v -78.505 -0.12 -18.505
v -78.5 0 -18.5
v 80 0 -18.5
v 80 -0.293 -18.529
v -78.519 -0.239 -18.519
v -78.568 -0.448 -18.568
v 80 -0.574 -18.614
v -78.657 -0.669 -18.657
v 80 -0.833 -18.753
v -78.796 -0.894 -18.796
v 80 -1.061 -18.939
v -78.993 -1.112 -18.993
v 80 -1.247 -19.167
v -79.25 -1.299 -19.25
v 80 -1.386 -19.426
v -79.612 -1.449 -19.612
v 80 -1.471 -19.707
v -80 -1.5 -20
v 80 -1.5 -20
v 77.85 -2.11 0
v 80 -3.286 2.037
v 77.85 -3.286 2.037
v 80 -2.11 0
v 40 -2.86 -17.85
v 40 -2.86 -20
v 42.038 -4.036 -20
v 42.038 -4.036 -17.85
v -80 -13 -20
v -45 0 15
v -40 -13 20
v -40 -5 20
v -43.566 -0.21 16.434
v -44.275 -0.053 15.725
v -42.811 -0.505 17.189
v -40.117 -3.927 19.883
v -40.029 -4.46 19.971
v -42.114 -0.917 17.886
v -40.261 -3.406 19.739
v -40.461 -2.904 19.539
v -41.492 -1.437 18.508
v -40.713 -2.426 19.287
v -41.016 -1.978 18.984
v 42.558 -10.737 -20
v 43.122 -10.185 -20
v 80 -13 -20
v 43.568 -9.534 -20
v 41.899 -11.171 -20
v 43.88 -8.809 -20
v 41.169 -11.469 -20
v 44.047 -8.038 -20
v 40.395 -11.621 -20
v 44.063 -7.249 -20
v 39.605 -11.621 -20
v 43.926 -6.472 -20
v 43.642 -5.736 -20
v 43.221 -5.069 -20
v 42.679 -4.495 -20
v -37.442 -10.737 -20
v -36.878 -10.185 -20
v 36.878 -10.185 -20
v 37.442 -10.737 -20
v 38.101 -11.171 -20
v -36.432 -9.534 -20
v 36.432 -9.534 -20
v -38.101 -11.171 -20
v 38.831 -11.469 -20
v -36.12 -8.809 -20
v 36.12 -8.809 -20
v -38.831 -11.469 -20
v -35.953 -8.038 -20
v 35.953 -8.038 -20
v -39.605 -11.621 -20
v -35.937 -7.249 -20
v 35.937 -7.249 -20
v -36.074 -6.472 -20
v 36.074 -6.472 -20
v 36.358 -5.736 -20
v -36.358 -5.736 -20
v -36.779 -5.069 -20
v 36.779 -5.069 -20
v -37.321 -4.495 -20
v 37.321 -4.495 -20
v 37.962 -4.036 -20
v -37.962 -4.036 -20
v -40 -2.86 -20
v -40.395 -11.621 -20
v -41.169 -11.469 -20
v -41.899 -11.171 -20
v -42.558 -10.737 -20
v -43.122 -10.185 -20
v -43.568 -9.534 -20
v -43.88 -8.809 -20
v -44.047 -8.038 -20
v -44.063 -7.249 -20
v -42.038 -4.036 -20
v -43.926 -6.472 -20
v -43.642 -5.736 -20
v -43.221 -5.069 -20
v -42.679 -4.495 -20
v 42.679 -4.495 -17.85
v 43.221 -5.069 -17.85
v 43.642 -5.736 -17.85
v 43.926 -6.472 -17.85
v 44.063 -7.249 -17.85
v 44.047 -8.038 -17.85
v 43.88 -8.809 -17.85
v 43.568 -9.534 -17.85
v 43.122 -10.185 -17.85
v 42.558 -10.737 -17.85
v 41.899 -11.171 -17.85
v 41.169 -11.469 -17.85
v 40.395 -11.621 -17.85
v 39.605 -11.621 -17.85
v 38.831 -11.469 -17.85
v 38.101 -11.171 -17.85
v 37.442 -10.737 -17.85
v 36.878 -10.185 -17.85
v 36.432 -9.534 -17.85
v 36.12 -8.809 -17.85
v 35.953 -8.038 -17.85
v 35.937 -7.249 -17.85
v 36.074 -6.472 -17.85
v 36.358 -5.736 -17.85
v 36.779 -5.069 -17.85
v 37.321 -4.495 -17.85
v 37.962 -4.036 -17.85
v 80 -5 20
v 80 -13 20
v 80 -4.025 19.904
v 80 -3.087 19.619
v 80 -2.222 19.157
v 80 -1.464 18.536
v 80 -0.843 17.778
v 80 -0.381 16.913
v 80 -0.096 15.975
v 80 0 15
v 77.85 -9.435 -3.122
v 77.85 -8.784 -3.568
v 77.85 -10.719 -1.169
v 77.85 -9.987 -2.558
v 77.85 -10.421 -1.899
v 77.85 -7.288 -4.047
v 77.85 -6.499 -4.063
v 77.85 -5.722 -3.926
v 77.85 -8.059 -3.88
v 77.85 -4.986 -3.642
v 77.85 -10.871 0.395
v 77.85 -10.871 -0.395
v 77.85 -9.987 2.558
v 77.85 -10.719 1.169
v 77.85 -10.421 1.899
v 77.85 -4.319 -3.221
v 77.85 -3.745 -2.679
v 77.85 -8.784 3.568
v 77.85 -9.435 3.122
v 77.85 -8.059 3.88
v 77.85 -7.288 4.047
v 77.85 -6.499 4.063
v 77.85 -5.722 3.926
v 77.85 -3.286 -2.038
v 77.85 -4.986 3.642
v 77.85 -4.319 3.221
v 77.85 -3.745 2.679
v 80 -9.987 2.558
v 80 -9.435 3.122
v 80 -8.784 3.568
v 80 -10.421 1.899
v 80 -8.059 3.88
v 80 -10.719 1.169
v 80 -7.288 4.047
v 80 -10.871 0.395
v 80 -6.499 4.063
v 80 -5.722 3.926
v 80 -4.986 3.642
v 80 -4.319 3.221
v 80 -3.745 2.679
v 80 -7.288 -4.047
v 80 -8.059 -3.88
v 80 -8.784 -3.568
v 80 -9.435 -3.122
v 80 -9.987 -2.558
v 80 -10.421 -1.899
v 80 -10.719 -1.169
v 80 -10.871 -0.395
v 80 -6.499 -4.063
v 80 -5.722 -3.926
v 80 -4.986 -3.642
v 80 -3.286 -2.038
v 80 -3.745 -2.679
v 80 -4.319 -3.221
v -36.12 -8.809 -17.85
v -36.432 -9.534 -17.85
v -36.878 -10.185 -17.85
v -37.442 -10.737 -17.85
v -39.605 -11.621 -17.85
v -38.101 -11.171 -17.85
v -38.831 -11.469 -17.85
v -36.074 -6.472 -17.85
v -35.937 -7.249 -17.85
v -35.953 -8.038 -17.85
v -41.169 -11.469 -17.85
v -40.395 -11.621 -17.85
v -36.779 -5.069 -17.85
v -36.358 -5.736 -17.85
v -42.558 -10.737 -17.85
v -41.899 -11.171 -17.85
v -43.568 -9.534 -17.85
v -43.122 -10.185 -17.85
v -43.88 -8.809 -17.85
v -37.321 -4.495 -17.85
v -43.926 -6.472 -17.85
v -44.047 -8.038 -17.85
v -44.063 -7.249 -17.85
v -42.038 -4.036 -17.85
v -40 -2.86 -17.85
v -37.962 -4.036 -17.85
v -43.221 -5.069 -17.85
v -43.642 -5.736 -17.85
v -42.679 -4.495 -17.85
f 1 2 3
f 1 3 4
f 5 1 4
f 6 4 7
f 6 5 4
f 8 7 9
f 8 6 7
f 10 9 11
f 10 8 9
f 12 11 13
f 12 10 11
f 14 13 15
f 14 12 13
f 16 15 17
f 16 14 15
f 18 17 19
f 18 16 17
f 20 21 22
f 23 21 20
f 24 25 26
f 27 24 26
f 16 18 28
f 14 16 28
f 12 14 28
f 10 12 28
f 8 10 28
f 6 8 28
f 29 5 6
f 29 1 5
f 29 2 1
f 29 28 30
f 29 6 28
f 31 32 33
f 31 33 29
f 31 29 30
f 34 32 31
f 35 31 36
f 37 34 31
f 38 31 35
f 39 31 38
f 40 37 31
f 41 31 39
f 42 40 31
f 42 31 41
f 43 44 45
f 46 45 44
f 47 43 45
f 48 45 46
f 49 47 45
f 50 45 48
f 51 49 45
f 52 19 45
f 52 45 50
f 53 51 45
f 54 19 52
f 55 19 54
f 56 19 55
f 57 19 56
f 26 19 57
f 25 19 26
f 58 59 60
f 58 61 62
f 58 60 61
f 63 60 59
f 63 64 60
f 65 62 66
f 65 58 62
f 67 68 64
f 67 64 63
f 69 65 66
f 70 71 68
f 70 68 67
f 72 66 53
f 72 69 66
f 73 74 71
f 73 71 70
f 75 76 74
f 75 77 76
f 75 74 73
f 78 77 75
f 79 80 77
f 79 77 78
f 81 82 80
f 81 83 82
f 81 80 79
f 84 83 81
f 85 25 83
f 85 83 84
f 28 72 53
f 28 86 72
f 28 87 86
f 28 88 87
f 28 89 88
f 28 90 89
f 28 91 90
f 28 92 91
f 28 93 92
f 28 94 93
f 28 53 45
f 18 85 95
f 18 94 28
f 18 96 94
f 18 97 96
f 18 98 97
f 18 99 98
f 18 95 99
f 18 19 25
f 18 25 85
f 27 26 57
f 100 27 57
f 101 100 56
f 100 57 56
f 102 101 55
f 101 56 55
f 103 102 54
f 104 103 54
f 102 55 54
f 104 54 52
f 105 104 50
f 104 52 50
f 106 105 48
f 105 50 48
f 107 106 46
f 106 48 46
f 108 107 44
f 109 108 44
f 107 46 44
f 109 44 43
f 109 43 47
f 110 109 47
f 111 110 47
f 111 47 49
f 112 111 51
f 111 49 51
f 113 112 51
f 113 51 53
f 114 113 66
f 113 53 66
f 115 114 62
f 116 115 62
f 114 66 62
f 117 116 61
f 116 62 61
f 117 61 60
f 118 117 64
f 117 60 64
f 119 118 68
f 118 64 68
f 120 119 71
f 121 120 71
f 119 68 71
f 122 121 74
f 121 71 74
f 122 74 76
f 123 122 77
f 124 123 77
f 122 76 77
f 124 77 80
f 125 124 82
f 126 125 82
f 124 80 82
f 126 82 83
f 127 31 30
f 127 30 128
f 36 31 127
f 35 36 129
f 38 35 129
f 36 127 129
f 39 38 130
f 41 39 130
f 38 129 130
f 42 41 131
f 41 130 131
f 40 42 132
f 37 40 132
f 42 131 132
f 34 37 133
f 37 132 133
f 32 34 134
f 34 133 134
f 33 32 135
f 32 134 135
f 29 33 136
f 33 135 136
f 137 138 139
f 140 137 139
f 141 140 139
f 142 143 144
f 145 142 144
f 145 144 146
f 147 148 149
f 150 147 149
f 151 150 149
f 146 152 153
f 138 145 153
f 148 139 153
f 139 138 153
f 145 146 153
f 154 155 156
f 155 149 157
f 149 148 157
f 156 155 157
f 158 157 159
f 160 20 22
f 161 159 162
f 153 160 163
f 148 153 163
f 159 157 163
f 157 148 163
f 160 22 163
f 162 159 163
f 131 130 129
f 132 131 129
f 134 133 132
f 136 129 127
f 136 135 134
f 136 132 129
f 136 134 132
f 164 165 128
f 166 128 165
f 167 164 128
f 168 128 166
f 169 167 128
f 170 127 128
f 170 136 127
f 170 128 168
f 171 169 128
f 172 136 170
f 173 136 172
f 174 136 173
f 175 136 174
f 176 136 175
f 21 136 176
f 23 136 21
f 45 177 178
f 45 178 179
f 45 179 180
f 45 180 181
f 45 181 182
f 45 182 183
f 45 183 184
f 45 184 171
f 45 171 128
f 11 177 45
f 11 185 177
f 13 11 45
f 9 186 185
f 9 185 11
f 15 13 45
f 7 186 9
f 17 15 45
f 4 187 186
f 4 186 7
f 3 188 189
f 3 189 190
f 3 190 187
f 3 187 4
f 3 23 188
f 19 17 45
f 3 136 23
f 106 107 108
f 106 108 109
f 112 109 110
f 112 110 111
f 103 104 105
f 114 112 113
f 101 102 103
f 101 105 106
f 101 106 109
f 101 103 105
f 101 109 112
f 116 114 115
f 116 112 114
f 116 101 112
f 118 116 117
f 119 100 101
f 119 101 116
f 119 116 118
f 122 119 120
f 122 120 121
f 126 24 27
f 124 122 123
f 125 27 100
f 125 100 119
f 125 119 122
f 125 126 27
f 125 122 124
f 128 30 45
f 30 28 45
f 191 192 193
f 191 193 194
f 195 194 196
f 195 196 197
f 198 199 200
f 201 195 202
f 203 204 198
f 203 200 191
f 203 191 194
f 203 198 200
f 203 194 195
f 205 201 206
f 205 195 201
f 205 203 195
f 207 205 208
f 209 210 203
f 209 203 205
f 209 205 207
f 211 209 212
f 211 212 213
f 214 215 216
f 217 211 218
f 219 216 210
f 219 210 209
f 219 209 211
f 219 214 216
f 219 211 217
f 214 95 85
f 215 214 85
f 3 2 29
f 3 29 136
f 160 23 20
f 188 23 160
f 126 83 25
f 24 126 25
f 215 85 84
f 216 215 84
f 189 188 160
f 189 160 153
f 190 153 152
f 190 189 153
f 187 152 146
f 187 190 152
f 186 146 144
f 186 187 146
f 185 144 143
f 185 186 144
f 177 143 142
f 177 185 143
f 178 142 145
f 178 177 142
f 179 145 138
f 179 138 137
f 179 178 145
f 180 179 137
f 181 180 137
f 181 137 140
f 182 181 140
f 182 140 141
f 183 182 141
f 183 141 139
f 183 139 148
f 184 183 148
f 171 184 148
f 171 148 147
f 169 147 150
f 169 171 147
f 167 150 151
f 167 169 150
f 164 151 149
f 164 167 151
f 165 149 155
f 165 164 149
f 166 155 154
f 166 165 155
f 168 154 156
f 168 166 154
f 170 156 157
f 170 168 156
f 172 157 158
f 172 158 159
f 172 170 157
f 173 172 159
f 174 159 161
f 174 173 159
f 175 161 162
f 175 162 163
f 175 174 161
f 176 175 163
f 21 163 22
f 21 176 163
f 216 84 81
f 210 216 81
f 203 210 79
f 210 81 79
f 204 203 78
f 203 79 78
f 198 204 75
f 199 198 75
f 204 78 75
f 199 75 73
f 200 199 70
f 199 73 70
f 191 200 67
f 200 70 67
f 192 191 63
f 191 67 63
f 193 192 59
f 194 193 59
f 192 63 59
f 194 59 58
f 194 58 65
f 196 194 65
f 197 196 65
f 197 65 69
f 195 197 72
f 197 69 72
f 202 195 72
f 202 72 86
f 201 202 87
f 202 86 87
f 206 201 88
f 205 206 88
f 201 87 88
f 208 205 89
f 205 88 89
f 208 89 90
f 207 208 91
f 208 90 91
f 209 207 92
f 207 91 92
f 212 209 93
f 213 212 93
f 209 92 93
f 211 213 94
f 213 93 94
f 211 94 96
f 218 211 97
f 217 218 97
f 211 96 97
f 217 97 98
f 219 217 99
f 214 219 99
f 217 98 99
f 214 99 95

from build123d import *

# Parameters (mm, degrees)
EXTRUDE_1_DEPTH     = 13
SWEEP_START         = -80
SWEEP_1_DEPTH       = 160
SKETCH_6_R          = 4.075
CUT_EXTRUDE_1_DEPTH = 2.15
FILLET_1_R          = 5
SKETCH_7_R          = 4.075
CUT_EXTRUDE_2_DEPTH = 2.15


# Read off the part's stored shape, not the designer's step: Вырез-По траектории1
with BuildPart() as part:
    # Эскиз1 → Бобышка-Вытянуть1 (new body)
    with BuildSketch(Plane(origin=(0, 0, 0), x_dir=(1, 0, 0), z_dir=(0, 1, 0))):
        Polygon((-40, -20), (80, -20), (80, 20), (-80, 20), align=None)
    extrude(amount=-EXTRUDE_1_DEPTH)

    # Вырез-По траектории1 outline → Вырез-По траектории1 (cut)
    with BuildSketch(Plane.YZ.offset(SWEEP_START)):
        with BuildLine():
            ThreePointArc((0, -18.5), (-1.060660172, -18.939339828), (-1.5, -20))
            Line((-1.5, -20), (0, -20))
            Line((0, -20), (0, -18.5))
        make_face()
    extrude(amount=SWEEP_1_DEPTH, mode=Mode.SUBTRACT)

    # Эскиз6 → Вырез-Вытянуть1 (cut)
    with BuildSketch(Plane(origin=(0, 0, -20), x_dir=(-1, 0, 0), z_dir=(0, 0, -1))):
        with Locations((-40, -7.565202347)):
            Circle(SKETCH_6_R)
        with BuildLine():
            Line((-40, -2.859797653), (-42.0375, -4.036148827))
            ThreePointArc((-42.0375, -4.036148827), (-40, -3.490202347), (-37.9625, -4.036148827))
            Line((-37.9625, -4.036148827), (-40, -2.859797653))
        make_face()
        with Locations((40, -7.565202347)):
            Circle(SKETCH_6_R)
        with BuildLine():
            ThreePointArc((37.9625, -4.036148827), (40, -3.490202347), (42.0375, -4.036148827))
            Line((42.0375, -4.036148827), (40, -2.859797653))
            Line((40, -2.859797653), (37.9625, -4.036148827))
        make_face()
    extrude(amount=-CUT_EXTRUDE_1_DEPTH, mode=Mode.SUBTRACT)

    # Скругление1
    fillet_1_edges = [part.edges().sort_by_distance(p)[0] for p in [
        (20, 0, 20),
    ]]
    fillet(fillet_1_edges, radius=FILLET_1_R)

    # Эскиз7 → Вырез-Вытянуть2 (cut)
    with BuildSketch(Plane.ZY.offset(-80)):
        with Locations((0, -6.815202347)):
            Circle(SKETCH_7_R)
        with BuildLine():
            Line((2.0375, -3.286148827), (0, -2.109797653))
            Line((0, -2.109797653), (-2.0375, -3.286148827))
            ThreePointArc((-2.0375, -3.286148827), (0, -2.740202347), (2.0375, -3.286148827))
        make_face()
    extrude(amount=CUT_EXTRUDE_2_DEPTH, mode=Mode.SUBTRACT)


solid = part.part
